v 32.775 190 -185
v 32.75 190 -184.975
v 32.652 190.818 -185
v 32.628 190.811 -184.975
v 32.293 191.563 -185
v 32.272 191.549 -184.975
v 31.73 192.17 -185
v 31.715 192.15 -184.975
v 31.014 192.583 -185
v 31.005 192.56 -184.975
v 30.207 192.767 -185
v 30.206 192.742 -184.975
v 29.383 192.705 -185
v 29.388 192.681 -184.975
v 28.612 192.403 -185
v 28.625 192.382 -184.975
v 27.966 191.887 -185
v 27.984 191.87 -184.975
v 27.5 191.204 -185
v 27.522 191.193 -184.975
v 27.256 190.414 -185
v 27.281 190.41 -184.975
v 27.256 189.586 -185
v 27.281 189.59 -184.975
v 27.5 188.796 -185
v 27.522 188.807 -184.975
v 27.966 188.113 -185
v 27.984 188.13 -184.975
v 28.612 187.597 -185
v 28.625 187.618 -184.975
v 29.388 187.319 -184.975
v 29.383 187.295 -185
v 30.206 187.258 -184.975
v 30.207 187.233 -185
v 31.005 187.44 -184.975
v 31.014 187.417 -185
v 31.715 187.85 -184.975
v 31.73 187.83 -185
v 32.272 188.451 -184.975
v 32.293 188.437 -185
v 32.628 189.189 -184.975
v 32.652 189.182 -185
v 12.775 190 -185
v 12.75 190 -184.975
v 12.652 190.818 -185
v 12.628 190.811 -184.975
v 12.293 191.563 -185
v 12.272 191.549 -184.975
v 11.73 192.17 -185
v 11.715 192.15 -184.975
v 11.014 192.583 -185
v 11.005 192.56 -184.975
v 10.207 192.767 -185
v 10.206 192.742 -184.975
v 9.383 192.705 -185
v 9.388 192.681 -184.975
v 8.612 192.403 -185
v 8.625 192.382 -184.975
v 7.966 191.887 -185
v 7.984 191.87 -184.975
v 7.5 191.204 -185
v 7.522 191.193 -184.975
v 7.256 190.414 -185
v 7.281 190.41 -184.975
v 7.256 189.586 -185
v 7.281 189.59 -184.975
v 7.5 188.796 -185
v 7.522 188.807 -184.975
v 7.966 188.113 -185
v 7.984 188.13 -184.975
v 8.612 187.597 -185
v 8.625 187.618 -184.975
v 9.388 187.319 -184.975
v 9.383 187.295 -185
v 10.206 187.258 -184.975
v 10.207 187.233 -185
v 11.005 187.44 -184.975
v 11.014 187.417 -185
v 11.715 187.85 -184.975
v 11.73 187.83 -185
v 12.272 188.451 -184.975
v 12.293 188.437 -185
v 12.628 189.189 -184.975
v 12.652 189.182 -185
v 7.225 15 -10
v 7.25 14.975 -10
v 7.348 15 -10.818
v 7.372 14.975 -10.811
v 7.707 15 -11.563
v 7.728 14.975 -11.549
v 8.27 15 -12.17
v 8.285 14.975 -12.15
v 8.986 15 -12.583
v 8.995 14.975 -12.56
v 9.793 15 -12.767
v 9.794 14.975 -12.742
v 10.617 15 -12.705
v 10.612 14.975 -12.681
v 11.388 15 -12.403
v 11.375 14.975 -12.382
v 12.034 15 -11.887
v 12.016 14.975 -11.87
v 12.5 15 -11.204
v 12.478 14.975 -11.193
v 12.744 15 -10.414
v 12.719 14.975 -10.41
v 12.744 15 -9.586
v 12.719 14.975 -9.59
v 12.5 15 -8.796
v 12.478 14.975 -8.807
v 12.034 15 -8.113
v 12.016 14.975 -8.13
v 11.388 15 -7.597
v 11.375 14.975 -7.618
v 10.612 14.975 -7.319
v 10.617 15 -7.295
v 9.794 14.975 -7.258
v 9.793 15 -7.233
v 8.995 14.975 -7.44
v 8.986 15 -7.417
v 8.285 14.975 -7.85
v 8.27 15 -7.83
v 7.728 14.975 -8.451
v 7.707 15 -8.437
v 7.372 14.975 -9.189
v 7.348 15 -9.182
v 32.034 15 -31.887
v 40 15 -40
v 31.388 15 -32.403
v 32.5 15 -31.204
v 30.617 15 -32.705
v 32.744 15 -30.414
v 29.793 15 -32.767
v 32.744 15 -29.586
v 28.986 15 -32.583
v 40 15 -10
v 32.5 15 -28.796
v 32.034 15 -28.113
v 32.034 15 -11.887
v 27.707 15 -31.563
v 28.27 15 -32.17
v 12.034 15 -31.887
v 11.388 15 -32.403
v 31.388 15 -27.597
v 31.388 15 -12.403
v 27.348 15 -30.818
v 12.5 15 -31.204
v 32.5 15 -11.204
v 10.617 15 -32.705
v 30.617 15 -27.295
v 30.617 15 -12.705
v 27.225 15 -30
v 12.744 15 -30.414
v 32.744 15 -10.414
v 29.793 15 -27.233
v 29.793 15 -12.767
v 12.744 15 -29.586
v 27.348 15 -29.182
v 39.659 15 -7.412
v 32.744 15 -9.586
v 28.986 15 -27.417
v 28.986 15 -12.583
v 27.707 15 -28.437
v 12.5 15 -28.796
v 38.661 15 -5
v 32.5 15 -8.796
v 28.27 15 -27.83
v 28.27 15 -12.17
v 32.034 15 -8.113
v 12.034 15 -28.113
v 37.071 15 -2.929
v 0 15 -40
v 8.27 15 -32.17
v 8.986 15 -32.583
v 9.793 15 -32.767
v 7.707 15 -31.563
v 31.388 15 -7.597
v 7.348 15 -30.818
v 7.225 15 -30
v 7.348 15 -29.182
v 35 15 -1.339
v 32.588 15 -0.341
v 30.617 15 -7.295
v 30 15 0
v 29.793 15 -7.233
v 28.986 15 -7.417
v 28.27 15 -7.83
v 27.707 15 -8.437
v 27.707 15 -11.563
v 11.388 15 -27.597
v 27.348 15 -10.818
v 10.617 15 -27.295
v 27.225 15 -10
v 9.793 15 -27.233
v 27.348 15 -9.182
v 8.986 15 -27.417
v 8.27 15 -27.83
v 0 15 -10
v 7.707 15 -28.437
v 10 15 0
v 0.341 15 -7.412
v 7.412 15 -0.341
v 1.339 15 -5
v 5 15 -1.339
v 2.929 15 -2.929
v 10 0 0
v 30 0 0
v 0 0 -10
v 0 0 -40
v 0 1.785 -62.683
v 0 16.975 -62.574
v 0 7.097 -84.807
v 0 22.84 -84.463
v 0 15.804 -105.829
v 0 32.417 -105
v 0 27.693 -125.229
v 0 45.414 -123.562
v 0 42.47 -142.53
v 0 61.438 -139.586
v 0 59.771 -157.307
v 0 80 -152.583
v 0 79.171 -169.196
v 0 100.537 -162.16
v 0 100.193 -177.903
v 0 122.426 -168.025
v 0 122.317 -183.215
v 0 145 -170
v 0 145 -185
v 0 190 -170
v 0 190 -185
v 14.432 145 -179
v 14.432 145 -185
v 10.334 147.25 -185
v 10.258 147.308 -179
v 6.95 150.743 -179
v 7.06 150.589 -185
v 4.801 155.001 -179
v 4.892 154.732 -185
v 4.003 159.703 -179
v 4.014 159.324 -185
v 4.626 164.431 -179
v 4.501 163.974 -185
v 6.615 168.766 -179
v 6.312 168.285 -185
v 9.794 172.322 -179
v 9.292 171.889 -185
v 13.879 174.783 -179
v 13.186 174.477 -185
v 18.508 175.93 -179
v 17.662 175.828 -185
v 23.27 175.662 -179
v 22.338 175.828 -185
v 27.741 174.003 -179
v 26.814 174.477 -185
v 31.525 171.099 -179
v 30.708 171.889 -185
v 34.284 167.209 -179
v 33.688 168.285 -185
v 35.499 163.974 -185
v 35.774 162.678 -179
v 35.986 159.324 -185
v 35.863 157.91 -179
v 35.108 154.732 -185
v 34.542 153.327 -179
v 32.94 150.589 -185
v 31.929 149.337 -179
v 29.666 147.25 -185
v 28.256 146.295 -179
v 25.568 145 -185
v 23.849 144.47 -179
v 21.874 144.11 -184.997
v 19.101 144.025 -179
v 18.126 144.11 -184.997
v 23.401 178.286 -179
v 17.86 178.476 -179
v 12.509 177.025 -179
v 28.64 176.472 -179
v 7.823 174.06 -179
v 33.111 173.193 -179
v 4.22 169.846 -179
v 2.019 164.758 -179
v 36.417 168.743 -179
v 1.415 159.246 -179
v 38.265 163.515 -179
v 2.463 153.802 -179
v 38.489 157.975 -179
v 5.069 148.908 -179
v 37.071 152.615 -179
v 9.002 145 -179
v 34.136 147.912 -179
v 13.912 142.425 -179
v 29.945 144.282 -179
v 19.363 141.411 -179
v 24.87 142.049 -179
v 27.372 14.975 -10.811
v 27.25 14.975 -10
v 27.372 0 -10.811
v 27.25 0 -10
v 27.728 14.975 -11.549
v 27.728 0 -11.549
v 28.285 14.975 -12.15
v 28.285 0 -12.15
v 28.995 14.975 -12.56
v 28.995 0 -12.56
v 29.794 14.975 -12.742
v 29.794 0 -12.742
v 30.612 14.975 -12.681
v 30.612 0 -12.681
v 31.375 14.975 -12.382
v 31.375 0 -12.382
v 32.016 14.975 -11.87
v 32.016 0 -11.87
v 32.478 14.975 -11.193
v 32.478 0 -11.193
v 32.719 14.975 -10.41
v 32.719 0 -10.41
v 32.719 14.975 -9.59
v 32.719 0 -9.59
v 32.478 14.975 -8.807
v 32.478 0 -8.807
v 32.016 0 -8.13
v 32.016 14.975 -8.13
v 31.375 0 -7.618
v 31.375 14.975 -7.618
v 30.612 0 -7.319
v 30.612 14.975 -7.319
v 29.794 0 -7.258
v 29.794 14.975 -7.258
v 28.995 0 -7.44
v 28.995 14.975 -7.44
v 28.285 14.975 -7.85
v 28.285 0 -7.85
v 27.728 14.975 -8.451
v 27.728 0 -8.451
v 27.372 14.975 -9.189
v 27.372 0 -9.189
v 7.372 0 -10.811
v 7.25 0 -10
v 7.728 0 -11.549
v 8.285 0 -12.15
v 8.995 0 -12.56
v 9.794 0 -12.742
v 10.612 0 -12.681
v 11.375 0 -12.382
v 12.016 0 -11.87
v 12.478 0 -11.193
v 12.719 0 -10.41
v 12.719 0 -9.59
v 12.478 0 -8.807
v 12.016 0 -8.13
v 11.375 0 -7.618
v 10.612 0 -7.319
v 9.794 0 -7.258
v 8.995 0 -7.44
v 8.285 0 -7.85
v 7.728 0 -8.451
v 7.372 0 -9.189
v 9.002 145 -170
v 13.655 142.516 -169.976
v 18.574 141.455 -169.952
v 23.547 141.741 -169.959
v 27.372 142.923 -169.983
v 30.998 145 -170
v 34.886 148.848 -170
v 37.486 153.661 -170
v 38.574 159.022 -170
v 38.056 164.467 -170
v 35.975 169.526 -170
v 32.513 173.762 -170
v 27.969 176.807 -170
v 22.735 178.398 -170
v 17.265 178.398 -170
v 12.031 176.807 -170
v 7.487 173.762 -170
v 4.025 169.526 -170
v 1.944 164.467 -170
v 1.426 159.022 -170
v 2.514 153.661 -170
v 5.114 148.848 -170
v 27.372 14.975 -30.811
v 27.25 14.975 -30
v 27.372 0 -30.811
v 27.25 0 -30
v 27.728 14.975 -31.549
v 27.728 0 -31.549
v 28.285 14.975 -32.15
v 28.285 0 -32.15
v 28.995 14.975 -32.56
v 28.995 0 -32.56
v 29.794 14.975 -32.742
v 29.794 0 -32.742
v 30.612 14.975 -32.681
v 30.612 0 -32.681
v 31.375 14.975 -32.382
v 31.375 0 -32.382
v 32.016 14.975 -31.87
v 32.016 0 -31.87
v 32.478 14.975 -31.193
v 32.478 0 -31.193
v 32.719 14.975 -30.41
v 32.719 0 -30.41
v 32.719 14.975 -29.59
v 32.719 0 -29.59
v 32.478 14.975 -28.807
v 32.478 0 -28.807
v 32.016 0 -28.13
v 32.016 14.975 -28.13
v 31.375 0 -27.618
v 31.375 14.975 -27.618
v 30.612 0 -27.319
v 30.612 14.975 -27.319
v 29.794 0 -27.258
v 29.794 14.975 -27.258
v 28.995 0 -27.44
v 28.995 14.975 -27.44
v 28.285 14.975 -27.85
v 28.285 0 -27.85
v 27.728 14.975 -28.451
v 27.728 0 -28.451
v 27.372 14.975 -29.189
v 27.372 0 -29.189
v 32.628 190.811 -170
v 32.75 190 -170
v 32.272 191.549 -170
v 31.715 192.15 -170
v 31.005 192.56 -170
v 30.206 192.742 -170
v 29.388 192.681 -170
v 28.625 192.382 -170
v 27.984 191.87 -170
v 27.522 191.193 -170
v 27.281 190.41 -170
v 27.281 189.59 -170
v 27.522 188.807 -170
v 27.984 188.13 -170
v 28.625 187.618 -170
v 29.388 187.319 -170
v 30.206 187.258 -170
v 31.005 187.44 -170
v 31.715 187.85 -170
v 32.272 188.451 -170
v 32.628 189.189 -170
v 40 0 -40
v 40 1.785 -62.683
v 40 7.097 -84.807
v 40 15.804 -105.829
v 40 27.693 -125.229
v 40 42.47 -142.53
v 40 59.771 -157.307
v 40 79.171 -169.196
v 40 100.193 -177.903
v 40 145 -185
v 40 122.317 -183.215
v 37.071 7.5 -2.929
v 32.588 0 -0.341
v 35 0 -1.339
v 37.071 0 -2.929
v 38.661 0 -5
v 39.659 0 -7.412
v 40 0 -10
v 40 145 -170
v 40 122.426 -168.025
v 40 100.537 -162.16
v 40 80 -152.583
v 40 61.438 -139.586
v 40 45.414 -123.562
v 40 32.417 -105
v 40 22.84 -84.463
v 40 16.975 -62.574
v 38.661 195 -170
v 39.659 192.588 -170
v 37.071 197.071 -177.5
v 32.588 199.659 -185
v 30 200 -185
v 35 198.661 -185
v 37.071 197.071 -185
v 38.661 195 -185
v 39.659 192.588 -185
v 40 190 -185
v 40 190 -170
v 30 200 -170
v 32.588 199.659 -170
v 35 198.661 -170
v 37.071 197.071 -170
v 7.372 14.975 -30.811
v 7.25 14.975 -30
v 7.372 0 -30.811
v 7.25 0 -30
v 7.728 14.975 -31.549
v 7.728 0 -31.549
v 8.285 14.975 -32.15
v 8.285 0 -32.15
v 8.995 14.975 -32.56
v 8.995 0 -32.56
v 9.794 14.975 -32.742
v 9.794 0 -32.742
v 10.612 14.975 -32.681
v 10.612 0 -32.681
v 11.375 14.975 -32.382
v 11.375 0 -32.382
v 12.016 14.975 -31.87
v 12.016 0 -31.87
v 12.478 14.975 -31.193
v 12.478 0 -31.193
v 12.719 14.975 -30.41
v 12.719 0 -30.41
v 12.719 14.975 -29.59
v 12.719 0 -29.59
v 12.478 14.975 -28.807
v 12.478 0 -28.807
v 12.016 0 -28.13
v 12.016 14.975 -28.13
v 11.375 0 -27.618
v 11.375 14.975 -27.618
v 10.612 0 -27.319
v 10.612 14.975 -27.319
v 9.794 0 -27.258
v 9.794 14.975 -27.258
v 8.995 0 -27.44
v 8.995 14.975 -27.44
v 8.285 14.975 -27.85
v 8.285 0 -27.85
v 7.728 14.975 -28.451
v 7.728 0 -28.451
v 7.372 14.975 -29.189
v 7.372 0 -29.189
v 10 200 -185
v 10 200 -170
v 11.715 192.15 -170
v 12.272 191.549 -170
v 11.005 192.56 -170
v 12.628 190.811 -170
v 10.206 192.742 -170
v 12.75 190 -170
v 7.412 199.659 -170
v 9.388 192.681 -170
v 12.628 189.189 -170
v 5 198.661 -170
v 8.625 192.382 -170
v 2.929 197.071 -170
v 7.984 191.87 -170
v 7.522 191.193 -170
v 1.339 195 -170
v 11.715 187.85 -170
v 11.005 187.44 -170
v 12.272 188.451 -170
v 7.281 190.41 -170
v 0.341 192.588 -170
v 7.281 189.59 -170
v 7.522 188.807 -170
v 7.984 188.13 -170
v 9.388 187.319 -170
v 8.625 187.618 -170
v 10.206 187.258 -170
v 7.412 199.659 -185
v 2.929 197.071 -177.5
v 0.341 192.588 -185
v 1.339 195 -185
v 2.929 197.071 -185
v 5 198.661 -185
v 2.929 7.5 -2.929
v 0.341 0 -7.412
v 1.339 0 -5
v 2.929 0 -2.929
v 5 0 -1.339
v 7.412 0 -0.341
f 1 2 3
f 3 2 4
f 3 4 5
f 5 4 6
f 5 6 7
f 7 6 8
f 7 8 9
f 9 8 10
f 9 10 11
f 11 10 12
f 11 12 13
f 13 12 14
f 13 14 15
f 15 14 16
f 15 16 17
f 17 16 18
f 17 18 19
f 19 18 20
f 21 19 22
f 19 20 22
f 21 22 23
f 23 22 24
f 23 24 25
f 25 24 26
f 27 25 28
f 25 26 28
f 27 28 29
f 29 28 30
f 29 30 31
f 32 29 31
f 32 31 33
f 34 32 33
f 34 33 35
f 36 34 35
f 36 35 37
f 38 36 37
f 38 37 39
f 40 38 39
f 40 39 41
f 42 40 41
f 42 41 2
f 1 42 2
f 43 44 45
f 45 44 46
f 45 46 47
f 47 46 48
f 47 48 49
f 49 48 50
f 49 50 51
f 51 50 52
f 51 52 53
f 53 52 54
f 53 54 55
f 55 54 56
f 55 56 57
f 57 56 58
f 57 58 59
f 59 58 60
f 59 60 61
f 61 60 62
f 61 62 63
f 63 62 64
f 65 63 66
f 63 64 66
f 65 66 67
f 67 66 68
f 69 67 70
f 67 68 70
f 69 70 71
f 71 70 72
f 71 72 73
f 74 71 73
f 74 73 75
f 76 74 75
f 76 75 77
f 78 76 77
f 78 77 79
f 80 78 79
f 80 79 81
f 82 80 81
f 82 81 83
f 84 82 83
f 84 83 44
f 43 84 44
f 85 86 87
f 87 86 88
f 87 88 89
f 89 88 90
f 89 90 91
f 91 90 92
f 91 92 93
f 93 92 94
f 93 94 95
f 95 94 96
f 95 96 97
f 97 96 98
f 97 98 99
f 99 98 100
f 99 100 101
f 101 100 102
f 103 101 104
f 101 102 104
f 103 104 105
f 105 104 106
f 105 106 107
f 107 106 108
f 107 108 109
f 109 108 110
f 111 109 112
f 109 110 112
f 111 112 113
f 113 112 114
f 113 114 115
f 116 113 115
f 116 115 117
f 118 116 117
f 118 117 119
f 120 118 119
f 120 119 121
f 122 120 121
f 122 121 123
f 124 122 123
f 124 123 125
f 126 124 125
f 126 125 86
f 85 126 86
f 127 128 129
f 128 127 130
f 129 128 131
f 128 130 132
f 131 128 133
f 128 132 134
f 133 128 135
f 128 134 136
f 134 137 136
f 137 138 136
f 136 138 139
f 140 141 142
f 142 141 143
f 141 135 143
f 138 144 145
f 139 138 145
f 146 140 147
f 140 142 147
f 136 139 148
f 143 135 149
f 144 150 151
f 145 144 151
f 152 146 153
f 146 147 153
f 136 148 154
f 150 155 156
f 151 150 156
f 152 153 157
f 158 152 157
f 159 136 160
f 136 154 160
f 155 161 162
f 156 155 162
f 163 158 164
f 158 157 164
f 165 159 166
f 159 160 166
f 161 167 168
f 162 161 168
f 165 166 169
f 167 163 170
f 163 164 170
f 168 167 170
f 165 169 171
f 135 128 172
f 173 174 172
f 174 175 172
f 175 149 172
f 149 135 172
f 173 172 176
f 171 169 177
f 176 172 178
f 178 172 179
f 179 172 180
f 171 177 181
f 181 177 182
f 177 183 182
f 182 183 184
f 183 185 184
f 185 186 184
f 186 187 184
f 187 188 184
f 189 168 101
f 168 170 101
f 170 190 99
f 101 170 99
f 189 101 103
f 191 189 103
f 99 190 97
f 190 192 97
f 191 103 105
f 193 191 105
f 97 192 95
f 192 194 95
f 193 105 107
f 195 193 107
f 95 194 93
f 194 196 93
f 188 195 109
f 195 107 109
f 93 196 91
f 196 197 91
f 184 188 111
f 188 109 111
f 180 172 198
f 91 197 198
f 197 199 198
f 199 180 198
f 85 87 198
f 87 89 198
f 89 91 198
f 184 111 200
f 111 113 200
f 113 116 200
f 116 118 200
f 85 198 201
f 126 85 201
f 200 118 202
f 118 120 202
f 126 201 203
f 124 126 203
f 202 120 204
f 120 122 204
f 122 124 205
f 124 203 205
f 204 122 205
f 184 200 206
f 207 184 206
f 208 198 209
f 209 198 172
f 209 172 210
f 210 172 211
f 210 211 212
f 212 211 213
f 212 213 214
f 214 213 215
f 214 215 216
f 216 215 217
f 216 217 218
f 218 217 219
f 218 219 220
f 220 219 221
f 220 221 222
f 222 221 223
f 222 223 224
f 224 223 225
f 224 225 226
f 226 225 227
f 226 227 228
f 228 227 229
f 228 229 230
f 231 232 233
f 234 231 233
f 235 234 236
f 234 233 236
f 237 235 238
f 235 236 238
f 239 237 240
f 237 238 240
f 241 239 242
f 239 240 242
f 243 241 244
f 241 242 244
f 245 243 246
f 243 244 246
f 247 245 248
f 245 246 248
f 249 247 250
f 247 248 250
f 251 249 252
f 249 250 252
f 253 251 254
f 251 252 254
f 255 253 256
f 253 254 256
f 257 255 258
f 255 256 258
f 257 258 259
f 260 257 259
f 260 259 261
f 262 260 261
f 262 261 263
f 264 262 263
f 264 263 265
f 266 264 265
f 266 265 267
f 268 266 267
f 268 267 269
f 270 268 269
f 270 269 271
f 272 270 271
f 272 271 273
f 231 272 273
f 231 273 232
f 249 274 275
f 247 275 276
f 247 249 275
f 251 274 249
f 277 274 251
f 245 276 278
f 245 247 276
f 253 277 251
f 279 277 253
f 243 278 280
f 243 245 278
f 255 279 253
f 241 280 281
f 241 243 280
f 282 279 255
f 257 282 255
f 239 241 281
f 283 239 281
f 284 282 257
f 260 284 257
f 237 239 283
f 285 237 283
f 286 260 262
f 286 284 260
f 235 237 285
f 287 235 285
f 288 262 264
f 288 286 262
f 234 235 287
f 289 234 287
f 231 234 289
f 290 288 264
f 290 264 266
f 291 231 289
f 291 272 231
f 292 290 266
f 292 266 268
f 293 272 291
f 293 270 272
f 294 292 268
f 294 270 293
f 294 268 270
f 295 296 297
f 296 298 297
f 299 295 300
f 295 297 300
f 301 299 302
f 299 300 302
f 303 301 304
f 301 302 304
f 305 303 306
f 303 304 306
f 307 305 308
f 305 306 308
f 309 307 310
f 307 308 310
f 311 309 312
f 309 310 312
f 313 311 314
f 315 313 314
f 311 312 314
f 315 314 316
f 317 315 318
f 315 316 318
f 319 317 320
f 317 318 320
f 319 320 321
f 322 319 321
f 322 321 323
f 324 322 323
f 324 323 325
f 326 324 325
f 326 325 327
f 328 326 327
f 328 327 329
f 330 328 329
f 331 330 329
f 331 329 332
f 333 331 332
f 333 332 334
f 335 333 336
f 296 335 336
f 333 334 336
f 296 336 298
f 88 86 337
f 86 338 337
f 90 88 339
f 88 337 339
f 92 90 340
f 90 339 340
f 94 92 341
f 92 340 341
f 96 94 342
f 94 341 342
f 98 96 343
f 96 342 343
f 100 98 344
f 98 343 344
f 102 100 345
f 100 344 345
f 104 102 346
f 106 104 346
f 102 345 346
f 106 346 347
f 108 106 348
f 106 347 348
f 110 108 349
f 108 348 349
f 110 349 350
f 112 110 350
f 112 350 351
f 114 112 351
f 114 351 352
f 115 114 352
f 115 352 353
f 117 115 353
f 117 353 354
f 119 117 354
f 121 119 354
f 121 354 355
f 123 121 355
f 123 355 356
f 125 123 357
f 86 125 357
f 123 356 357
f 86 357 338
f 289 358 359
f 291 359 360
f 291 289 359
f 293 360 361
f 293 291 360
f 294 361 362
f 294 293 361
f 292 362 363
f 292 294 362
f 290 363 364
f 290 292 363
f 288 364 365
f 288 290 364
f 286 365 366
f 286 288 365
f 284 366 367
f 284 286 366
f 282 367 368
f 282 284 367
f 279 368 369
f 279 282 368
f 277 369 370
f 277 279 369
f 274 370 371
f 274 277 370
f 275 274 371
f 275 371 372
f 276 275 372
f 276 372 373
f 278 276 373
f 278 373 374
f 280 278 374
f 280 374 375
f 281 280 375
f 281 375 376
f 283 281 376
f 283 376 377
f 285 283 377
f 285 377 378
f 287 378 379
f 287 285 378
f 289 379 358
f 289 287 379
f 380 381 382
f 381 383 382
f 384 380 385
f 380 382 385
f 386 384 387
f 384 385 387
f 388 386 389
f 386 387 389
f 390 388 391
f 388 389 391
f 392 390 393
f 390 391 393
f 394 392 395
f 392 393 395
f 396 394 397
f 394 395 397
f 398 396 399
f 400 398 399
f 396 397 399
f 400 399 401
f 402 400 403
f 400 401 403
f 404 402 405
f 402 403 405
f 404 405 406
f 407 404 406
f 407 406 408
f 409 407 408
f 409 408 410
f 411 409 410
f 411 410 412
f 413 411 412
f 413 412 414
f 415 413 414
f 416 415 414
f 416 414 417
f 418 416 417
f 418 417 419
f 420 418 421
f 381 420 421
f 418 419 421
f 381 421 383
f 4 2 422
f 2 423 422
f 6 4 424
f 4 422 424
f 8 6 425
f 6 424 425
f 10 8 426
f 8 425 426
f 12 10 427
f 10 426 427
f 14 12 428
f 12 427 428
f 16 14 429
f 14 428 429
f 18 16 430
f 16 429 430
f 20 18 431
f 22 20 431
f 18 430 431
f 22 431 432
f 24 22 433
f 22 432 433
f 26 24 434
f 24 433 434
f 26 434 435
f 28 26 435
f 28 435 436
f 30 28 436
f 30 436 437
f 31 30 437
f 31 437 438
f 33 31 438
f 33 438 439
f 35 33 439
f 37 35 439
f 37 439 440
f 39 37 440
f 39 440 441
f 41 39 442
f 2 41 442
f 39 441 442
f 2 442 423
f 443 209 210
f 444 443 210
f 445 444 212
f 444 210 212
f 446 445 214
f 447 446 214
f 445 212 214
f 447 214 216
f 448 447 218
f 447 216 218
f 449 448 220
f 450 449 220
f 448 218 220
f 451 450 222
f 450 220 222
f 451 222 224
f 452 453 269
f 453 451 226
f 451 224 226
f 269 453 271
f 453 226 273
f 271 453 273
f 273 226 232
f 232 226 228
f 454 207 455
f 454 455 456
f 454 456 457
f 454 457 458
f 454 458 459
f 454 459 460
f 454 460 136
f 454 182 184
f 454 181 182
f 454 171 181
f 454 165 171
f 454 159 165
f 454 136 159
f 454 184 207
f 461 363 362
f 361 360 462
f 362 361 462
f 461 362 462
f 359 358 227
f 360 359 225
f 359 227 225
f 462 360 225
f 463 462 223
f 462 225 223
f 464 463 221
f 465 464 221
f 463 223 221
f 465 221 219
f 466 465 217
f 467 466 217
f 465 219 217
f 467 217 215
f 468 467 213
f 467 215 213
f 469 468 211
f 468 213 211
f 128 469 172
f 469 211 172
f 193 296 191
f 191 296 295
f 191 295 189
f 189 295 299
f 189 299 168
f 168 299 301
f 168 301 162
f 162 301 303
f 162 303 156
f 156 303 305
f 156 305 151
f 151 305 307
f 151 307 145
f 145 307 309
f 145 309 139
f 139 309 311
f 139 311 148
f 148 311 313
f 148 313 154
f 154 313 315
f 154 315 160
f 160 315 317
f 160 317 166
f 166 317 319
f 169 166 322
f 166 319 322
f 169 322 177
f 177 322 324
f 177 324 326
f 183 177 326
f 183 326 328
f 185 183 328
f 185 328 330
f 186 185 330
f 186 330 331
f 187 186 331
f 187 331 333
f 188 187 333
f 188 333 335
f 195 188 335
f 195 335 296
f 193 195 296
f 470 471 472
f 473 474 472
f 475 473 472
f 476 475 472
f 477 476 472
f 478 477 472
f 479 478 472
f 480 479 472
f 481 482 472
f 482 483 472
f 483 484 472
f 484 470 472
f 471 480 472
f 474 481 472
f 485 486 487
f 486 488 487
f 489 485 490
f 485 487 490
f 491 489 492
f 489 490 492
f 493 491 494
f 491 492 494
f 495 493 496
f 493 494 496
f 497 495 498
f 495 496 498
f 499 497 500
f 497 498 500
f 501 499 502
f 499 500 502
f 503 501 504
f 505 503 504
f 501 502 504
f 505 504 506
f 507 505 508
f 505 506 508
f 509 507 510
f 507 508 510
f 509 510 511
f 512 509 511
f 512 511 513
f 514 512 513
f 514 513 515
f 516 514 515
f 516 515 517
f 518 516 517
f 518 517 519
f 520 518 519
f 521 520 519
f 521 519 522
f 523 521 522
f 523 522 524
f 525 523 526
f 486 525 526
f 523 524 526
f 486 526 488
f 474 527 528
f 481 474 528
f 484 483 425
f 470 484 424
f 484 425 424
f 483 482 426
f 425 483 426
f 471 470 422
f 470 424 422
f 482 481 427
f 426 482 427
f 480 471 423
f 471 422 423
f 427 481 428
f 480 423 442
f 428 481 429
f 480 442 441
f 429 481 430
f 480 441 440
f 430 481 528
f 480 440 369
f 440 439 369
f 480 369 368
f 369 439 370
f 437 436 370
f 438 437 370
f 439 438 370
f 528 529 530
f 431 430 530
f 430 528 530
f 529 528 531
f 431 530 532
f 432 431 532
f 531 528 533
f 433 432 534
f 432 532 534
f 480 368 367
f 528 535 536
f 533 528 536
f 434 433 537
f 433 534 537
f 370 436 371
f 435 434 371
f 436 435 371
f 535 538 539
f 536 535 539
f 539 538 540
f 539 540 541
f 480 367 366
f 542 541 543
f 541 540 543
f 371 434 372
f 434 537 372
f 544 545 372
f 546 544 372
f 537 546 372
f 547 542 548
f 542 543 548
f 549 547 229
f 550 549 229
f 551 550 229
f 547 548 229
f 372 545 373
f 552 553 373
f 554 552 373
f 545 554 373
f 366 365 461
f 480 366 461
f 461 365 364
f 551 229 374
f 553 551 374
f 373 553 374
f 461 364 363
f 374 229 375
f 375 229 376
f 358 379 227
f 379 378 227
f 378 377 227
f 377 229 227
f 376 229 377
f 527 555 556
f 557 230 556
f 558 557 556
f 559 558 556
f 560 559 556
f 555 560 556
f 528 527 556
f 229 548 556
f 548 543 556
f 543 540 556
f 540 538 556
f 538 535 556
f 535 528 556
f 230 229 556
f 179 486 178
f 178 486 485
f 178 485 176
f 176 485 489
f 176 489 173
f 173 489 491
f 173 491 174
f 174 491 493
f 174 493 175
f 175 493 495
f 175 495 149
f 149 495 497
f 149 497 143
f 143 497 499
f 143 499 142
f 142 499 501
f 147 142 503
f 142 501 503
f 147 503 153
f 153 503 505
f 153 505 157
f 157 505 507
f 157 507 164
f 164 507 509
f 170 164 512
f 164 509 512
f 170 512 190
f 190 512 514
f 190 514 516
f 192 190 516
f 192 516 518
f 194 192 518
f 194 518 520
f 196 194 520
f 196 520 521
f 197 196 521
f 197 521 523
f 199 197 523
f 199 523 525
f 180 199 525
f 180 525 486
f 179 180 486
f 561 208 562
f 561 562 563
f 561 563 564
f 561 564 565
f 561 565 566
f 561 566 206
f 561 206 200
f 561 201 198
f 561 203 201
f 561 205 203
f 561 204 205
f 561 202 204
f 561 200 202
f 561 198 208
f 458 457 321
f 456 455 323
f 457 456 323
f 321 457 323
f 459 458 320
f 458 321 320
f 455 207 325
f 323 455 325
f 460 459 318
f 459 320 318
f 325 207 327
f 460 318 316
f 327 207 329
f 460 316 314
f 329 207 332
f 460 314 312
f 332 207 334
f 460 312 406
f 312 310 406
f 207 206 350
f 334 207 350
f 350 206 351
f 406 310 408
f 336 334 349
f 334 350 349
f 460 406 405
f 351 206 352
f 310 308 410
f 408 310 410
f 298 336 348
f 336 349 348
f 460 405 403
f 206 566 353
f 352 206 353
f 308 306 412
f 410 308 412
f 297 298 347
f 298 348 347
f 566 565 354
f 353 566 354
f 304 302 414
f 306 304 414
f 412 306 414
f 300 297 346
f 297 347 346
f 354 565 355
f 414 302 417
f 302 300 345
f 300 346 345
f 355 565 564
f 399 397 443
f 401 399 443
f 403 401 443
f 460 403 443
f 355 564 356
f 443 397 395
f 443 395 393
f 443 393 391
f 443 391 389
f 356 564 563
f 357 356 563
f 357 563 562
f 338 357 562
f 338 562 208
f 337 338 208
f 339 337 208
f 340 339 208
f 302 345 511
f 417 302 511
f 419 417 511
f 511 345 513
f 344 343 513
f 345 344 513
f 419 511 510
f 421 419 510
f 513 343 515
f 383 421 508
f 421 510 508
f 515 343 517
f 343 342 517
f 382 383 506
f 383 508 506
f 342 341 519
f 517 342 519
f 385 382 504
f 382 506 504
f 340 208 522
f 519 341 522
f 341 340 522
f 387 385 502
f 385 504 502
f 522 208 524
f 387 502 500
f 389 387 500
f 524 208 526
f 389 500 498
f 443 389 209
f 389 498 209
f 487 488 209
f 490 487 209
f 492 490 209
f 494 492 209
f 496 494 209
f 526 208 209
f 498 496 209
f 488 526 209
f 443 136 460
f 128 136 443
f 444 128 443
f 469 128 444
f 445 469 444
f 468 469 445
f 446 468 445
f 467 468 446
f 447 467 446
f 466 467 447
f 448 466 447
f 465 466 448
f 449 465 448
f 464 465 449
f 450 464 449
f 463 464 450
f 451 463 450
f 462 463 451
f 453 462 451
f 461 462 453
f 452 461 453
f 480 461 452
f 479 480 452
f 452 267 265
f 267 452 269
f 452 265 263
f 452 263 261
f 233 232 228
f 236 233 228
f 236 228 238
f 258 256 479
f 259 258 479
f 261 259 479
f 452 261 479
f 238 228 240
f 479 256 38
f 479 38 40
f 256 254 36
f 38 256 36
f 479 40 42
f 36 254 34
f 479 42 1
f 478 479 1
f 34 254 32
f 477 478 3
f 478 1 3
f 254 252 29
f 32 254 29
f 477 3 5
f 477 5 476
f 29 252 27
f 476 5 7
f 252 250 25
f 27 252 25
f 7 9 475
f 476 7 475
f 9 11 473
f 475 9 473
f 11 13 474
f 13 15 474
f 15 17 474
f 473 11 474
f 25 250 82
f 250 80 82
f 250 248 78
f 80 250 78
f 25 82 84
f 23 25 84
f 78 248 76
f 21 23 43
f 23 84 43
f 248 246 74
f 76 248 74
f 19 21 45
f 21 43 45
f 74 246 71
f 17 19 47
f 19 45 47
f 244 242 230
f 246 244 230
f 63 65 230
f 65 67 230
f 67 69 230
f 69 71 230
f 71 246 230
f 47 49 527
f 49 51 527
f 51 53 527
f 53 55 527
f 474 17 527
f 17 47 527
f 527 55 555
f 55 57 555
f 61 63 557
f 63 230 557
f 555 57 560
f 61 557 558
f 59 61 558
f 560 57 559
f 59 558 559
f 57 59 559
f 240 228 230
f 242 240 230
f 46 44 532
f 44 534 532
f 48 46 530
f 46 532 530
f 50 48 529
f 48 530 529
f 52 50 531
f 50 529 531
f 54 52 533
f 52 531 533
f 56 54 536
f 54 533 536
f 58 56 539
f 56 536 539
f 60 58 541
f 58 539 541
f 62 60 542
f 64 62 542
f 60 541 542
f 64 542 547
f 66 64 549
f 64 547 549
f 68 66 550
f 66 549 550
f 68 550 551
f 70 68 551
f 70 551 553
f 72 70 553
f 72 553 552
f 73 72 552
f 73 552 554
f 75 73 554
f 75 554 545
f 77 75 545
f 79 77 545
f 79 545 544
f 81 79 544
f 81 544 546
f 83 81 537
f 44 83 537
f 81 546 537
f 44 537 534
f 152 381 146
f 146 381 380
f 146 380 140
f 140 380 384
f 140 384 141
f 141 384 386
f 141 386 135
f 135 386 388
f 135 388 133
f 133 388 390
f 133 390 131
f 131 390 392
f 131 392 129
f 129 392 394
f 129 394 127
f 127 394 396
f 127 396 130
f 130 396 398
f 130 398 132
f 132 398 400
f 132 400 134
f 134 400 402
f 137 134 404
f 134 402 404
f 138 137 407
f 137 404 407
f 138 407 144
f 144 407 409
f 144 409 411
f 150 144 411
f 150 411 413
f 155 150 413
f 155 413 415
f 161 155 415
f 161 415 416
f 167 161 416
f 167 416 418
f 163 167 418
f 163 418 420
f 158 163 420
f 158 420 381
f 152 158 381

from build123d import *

# Parameters (mm, degrees)
BOSS_EXTRUDE2_DEPTH            = 40
M5_CLEARANCE_HOLE2_D           = 5.5
M5_CLEARANCE_HOLE2_CSINK_D     = 5.55
M5_CLEARANCE_HOLE2_CSINK_ANGLE = 90
CUT_EXTRUDE1_REACH             = 277.363
SKETCH10_R                     = 16
CUT_EXTRUDE2_DEPTH             = 10
CUT_EXTRUDE2_DEPTH_BACK        = 9
SKETCH12_R                     = 18.6
FILLET1_R                      = 10
M5_CLEARANCE_HOLE3_D           = 5.5
M5_CLEARANCE_HOLE3_CSINK_D     = 5.55
M5_CLEARANCE_HOLE3_CSINK_ANGLE = 90


with BuildPart() as part:
    # Sketch6 → Boss-Extrude2 (new body)
    with BuildSketch(Plane(origin=(0, 0, 0), x_dir=(0, 0, -1), z_dir=(1, 0, 0))):
        with BuildLine():
            Line((0, 0), (40, 0))
            ThreePointArc((40, 0), (142.530483272, 42.469516728), (185, 145))
            Line((185, 145), (185, 200))
            Line((185, 200), (170, 200))
            Line((170, 200), (170, 145))
            ThreePointArc((170, 145), (131.923881554, 53.076118446), (40, 15))
            Line((40, 15), (0, 15))
            Line((0, 15), (0, 0))
        make_face()
    extrude(amount=BOSS_EXTRUDE2_DEPTH)

    # M5 Clearance Hole2 (through all)
    with Locations(Plane(origin=(0, 15, 0), x_dir=(1, 0, 0), z_dir=(0, 1, 0))):
        with Locations((10, 30), (30, 30), (10, 10), (30, 10)):
            CounterSinkHole(M5_CLEARANCE_HOLE2_D / 2, M5_CLEARANCE_HOLE2_CSINK_D / 2, counter_sink_angle=M5_CLEARANCE_HOLE2_CSINK_ANGLE)

    # Sketch10 → Cut-Extrude1 (cut, up to next)
    with BuildSketch(Plane(origin=(0, 0, -185), x_dir=(-1, 0, 0), z_dir=(0, 0, -1)), mode=Mode.PRIVATE) as cut_extrude1_sk1:
        with Locations((-20, 160)):
            Circle(SKETCH10_R)
    cut_extrude1_tool1 = extrude(cut_extrude1_sk1.sketch, amount=-CUT_EXTRUDE1_REACH, mode=Mode.PRIVATE) & part.part
    add(cut_extrude1_tool1.solids().sort_by_distance((20, 160, -185))[0], mode=Mode.SUBTRACT)

    # Sketch12 → Cut-Extrude2 (cut, two sides: drawn at the far end of the back side and taken through both)
    with BuildSketch(Plane.XY.offset(-170).offset(-CUT_EXTRUDE2_DEPTH_BACK)):
        with Locations((20, 160)):
            Circle(SKETCH12_R)
    extrude(amount=CUT_EXTRUDE2_DEPTH + CUT_EXTRUDE2_DEPTH_BACK, mode=Mode.SUBTRACT)

    # Fillet1
    fillet1_edges = [part.edges().sort_by_distance(p)[0] for p in [
        (40, 7.5, 0),
        (0, 7.5, 0),
        (40, 200, -177.5),
        (0, 200, -177.5),
    ]]
    fillet(fillet1_edges, radius=FILLET1_R)

    # M5 Clearance Hole3 (through all)
    with Locations(Plane(origin=(0, 0, -185), x_dir=(-1, 0, 0), z_dir=(0, 0, -1))):
        with Locations((-30, 190), (-10, 190)):
            CounterSinkHole(M5_CLEARANCE_HOLE3_D / 2, M5_CLEARANCE_HOLE3_CSINK_D / 2, counter_sink_angle=M5_CLEARANCE_HOLE3_CSINK_ANGLE)


solid = part.part
